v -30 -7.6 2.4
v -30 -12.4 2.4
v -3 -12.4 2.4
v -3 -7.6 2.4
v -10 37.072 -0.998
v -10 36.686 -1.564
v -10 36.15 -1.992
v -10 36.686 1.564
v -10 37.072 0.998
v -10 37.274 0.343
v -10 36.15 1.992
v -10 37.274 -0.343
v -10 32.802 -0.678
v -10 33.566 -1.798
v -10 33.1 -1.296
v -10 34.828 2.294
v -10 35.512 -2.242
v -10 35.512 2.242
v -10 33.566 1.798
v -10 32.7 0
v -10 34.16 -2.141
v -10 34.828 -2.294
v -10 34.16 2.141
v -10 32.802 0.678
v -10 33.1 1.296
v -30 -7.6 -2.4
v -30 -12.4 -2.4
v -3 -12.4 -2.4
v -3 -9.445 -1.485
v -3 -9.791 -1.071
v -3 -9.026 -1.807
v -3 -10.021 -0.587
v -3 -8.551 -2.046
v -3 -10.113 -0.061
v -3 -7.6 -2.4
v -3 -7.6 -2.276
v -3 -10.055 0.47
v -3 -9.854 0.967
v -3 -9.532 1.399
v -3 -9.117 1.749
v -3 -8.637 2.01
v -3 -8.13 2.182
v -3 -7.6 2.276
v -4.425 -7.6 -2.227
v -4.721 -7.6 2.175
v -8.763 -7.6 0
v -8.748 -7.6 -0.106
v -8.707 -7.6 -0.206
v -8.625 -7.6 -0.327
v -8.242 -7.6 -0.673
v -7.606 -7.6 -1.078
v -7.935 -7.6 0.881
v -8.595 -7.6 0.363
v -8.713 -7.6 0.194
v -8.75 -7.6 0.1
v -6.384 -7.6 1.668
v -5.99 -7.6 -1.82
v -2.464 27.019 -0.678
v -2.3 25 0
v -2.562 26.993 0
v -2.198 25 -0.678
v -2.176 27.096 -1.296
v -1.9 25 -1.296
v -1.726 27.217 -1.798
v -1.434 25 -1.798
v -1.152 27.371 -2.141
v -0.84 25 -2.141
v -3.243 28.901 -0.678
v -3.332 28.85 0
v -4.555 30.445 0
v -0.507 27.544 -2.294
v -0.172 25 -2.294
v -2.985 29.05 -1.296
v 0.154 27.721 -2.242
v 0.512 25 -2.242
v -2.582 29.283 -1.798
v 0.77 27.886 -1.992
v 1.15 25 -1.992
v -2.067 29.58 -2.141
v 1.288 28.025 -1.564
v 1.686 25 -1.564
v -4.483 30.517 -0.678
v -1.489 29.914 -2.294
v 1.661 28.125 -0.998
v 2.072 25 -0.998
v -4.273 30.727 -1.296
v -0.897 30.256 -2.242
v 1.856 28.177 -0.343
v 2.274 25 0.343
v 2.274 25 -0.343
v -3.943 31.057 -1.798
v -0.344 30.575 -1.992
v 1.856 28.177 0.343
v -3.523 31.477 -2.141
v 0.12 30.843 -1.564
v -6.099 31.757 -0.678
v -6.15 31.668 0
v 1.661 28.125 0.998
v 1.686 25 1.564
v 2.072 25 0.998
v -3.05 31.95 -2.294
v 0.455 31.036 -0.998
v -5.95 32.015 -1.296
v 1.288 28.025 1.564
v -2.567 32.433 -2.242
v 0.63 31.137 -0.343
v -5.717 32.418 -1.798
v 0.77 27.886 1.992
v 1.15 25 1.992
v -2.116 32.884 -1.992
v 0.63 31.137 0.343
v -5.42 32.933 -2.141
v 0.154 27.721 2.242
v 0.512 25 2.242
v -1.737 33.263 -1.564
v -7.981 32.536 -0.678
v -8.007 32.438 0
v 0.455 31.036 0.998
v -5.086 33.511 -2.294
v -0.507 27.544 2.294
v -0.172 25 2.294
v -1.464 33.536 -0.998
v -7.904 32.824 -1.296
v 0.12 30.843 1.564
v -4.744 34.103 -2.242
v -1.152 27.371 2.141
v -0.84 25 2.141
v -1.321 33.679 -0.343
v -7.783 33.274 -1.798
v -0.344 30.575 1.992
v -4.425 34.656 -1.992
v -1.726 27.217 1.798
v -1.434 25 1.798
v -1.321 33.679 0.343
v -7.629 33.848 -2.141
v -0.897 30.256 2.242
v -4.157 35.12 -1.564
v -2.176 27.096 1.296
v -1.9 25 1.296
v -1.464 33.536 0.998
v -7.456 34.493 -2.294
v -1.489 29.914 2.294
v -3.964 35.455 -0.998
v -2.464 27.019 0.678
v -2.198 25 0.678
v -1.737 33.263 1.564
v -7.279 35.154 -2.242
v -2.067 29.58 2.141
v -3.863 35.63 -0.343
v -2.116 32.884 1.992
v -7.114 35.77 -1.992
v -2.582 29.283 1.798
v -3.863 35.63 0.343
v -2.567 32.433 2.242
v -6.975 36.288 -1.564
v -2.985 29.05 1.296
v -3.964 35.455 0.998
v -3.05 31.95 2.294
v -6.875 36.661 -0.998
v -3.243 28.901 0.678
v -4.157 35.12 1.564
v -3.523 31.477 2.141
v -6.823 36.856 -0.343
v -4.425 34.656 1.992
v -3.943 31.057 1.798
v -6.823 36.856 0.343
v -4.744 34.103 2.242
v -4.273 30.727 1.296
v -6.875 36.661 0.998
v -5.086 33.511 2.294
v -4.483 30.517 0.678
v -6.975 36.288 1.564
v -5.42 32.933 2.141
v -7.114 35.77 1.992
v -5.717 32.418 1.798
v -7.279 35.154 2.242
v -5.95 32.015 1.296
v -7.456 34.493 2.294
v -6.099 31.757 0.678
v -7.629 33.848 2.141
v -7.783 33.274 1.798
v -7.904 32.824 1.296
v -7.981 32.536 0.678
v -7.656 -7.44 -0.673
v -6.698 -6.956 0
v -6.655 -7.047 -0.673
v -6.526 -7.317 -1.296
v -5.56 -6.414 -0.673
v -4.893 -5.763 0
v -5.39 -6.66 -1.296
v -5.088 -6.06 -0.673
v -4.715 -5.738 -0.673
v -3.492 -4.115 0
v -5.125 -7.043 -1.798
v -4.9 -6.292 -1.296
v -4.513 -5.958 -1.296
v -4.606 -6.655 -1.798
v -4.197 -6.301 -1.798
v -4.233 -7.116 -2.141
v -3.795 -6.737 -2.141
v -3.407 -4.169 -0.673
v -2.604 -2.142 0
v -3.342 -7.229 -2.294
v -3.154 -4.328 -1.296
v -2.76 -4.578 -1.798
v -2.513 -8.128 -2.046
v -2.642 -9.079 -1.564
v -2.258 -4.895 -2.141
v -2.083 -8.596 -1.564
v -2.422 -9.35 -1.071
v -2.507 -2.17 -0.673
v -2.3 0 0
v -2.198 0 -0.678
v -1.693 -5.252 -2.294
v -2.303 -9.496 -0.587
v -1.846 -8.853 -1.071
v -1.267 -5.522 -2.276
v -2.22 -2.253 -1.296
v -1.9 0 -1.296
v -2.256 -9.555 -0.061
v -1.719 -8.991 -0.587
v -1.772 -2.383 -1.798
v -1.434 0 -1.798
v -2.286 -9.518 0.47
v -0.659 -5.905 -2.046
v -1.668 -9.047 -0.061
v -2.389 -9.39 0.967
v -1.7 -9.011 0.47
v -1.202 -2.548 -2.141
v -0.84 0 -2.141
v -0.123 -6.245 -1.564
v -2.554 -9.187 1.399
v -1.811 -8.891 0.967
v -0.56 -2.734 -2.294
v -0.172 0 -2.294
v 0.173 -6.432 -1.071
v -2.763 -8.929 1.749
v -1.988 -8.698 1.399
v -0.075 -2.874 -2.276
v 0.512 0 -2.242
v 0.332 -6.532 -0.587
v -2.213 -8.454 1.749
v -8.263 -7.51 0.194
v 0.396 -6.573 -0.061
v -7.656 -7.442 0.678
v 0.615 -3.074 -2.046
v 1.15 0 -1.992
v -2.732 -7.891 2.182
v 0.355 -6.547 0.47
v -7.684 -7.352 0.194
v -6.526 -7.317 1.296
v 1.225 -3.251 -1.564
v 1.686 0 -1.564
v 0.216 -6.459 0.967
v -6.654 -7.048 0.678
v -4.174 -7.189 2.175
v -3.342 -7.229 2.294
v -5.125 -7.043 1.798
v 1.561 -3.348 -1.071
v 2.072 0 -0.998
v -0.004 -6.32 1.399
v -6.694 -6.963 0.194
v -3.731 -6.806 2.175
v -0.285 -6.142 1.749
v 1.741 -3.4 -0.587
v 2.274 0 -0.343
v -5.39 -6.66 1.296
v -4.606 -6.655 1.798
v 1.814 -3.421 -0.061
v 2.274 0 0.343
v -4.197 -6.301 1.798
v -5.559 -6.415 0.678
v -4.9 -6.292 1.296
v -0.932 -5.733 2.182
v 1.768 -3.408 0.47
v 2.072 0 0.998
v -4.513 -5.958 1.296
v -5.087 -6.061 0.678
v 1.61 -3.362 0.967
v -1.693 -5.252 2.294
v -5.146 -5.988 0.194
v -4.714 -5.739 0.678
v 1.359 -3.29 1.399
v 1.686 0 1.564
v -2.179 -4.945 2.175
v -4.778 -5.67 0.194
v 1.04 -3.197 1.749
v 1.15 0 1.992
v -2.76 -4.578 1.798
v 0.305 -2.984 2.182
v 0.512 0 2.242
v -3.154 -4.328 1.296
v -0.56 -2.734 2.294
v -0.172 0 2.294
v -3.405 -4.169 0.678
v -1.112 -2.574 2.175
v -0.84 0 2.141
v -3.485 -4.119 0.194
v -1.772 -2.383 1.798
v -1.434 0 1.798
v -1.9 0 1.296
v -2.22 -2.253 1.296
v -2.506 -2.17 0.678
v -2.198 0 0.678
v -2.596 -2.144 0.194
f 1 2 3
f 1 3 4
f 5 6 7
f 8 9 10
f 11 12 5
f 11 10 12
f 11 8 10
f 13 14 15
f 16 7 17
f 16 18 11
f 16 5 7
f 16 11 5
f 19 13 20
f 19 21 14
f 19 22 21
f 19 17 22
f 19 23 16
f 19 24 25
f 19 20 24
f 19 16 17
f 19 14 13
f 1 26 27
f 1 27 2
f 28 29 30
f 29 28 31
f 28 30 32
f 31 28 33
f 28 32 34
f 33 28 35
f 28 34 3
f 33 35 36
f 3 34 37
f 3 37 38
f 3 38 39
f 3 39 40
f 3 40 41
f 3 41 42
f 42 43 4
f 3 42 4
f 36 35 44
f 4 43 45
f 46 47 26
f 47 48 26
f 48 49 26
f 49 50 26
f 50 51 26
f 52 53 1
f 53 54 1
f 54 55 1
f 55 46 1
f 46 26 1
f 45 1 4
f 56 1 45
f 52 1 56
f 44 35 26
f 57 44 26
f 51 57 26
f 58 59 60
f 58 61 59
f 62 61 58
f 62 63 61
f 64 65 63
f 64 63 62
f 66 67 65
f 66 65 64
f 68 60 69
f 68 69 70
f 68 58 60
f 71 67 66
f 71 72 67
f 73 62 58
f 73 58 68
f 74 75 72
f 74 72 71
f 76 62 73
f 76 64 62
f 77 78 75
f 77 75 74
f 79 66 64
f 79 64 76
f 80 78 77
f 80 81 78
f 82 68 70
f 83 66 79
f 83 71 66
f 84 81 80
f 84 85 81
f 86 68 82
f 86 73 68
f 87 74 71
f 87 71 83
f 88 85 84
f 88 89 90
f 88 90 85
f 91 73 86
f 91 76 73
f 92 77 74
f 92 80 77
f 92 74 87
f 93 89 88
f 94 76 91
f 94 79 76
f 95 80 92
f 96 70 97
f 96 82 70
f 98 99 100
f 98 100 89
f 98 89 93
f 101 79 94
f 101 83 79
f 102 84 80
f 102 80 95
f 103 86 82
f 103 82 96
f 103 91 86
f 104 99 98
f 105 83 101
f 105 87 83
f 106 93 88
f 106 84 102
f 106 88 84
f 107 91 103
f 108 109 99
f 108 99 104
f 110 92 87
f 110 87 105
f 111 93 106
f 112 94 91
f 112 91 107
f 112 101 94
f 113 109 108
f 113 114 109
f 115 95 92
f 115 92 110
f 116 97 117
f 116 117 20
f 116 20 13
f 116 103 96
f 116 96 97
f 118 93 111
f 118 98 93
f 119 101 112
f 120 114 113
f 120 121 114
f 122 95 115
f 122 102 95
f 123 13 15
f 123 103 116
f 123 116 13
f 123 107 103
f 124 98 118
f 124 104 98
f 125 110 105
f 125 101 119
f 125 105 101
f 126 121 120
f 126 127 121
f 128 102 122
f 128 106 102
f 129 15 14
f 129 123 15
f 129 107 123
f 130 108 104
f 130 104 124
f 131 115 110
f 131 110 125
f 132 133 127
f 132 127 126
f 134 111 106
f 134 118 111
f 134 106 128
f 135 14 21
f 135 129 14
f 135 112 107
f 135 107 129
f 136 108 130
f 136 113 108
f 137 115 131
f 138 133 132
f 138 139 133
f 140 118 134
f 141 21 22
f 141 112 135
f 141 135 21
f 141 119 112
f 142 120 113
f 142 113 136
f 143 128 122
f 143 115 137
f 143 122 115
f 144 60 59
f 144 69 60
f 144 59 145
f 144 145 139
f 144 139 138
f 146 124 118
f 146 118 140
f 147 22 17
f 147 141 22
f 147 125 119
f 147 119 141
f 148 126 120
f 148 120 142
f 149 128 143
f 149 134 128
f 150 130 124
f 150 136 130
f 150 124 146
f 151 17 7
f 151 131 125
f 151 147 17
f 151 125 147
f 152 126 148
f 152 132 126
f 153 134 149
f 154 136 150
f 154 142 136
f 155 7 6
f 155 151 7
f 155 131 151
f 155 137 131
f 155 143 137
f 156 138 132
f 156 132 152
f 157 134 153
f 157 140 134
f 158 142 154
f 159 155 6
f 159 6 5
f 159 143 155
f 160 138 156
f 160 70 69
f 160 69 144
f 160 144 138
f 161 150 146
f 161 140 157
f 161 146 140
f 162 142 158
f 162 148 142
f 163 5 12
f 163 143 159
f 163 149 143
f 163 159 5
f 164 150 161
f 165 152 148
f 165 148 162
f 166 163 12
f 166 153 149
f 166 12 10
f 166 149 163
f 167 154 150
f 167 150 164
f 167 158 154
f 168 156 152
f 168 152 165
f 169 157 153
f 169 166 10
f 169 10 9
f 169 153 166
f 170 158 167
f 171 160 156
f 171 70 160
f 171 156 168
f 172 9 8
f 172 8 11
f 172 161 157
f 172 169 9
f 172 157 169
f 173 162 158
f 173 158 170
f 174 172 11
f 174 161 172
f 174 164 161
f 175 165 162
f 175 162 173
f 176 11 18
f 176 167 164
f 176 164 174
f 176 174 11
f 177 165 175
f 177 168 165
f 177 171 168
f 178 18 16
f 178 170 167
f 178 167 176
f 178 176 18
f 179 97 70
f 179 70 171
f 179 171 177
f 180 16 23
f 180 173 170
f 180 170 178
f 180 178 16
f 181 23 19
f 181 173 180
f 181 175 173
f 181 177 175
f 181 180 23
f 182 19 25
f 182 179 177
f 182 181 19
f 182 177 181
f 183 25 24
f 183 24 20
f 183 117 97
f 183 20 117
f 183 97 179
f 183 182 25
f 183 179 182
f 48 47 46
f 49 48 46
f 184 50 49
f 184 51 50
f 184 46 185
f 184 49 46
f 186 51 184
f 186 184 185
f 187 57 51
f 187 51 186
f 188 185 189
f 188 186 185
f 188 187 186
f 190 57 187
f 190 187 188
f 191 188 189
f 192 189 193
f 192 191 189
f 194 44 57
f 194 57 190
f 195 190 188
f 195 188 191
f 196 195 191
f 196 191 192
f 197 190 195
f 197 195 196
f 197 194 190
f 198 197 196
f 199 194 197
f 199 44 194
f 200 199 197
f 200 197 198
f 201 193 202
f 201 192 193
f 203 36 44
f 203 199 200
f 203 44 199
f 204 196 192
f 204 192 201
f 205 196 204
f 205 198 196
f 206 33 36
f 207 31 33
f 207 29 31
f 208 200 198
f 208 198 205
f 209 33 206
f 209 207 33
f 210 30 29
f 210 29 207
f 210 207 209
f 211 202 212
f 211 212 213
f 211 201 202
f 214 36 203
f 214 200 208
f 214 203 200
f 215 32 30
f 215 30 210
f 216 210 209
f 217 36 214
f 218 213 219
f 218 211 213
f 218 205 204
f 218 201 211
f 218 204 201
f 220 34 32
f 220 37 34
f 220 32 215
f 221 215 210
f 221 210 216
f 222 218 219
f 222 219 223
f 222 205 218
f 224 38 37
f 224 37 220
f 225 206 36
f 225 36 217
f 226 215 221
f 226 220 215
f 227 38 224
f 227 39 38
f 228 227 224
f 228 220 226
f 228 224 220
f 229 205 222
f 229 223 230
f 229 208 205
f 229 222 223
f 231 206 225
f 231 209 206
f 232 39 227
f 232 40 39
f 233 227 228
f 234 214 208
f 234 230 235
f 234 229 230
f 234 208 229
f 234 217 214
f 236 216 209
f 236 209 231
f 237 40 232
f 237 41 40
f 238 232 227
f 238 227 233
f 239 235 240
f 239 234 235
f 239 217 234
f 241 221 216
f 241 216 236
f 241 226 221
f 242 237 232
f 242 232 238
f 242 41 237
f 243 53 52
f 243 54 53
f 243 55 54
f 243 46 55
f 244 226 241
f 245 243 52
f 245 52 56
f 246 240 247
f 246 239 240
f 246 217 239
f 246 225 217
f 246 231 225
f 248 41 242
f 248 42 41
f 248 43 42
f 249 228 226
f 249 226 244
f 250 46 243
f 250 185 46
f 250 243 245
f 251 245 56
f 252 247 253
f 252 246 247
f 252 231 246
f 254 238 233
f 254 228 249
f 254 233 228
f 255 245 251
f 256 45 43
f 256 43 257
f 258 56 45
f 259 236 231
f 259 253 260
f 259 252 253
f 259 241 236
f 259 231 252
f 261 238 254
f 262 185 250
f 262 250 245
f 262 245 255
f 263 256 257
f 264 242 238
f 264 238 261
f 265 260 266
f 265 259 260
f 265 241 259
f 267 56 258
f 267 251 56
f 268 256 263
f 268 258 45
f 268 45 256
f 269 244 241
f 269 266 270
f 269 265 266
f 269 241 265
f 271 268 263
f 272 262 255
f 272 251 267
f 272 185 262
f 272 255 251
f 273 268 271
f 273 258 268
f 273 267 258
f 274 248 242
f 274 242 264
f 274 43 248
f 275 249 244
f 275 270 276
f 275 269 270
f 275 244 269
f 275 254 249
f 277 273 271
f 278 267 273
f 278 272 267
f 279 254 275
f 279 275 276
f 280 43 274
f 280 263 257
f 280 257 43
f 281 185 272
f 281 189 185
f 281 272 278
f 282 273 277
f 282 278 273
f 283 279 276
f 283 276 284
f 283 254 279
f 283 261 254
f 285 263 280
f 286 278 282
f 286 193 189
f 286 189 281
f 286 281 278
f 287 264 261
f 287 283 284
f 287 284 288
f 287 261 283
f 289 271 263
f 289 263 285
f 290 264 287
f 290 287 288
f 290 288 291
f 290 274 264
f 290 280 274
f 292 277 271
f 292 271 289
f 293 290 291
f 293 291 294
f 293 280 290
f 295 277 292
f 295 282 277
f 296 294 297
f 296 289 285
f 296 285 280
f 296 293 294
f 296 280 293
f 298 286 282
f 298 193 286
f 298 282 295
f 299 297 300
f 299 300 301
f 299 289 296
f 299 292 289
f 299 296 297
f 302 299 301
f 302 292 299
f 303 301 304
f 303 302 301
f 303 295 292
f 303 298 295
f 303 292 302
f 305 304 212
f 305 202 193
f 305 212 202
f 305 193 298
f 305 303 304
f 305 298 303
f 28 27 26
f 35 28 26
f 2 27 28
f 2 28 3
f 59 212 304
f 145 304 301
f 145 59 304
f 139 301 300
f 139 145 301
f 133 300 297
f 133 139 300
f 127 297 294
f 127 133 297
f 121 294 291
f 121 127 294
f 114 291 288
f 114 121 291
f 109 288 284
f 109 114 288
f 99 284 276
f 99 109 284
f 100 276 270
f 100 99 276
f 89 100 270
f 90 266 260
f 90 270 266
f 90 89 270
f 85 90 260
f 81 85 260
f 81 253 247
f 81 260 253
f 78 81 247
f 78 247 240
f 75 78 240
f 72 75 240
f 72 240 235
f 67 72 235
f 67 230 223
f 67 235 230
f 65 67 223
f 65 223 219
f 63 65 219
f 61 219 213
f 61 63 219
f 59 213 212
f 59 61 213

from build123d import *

# Parameters (mm, degrees)
VARREDURA1_PROFILE_R          = 2.3
ESBO_O18_W                    = 4.8
ESBO_O18_H                    = 4.8
RESSALTO_EXTRUS_O1_DEPTH      = 20
RESSALTO_EXTRUS_O1_DEPTH_BACK = 7


with BuildPart() as part:
    # Varredura1: sweep along a path in Esboço1
    with BuildLine(Plane.XY) as varredura1_path:
        ThreePointArc((-10, -10), (-2.928932188, -7.071067812), (0, 0))
        Line((0, 0), (0, 25))
        ThreePointArc((0, 25), (-2.928932188, 32.071067812), (-10, 35))
    # Varredura1 profile (on start of the path) → Varredura1 (sweep)
    with BuildSketch(Plane(origin=(-10, -10, 0), x_dir=(0, 1, 0), z_dir=(1, 0, 0))):
        Circle(VARREDURA1_PROFILE_R)
    sweep(path=varredura1_path.line)

    # Esboço18 → Ressalto-extrusão1 (add, two sides)
    with BuildSketch(Plane.ZY.offset(10)) as ressalto_extrus_o1_sk:
        with Locations((0, -10)):
            Rectangle(ESBO_O18_W, ESBO_O18_H)
    extrude(amount=RESSALTO_EXTRUS_O1_DEPTH)
    extrude(ressalto_extrus_o1_sk.sketch, amount=-RESSALTO_EXTRUS_O1_DEPTH_BACK)


solid = part.part
